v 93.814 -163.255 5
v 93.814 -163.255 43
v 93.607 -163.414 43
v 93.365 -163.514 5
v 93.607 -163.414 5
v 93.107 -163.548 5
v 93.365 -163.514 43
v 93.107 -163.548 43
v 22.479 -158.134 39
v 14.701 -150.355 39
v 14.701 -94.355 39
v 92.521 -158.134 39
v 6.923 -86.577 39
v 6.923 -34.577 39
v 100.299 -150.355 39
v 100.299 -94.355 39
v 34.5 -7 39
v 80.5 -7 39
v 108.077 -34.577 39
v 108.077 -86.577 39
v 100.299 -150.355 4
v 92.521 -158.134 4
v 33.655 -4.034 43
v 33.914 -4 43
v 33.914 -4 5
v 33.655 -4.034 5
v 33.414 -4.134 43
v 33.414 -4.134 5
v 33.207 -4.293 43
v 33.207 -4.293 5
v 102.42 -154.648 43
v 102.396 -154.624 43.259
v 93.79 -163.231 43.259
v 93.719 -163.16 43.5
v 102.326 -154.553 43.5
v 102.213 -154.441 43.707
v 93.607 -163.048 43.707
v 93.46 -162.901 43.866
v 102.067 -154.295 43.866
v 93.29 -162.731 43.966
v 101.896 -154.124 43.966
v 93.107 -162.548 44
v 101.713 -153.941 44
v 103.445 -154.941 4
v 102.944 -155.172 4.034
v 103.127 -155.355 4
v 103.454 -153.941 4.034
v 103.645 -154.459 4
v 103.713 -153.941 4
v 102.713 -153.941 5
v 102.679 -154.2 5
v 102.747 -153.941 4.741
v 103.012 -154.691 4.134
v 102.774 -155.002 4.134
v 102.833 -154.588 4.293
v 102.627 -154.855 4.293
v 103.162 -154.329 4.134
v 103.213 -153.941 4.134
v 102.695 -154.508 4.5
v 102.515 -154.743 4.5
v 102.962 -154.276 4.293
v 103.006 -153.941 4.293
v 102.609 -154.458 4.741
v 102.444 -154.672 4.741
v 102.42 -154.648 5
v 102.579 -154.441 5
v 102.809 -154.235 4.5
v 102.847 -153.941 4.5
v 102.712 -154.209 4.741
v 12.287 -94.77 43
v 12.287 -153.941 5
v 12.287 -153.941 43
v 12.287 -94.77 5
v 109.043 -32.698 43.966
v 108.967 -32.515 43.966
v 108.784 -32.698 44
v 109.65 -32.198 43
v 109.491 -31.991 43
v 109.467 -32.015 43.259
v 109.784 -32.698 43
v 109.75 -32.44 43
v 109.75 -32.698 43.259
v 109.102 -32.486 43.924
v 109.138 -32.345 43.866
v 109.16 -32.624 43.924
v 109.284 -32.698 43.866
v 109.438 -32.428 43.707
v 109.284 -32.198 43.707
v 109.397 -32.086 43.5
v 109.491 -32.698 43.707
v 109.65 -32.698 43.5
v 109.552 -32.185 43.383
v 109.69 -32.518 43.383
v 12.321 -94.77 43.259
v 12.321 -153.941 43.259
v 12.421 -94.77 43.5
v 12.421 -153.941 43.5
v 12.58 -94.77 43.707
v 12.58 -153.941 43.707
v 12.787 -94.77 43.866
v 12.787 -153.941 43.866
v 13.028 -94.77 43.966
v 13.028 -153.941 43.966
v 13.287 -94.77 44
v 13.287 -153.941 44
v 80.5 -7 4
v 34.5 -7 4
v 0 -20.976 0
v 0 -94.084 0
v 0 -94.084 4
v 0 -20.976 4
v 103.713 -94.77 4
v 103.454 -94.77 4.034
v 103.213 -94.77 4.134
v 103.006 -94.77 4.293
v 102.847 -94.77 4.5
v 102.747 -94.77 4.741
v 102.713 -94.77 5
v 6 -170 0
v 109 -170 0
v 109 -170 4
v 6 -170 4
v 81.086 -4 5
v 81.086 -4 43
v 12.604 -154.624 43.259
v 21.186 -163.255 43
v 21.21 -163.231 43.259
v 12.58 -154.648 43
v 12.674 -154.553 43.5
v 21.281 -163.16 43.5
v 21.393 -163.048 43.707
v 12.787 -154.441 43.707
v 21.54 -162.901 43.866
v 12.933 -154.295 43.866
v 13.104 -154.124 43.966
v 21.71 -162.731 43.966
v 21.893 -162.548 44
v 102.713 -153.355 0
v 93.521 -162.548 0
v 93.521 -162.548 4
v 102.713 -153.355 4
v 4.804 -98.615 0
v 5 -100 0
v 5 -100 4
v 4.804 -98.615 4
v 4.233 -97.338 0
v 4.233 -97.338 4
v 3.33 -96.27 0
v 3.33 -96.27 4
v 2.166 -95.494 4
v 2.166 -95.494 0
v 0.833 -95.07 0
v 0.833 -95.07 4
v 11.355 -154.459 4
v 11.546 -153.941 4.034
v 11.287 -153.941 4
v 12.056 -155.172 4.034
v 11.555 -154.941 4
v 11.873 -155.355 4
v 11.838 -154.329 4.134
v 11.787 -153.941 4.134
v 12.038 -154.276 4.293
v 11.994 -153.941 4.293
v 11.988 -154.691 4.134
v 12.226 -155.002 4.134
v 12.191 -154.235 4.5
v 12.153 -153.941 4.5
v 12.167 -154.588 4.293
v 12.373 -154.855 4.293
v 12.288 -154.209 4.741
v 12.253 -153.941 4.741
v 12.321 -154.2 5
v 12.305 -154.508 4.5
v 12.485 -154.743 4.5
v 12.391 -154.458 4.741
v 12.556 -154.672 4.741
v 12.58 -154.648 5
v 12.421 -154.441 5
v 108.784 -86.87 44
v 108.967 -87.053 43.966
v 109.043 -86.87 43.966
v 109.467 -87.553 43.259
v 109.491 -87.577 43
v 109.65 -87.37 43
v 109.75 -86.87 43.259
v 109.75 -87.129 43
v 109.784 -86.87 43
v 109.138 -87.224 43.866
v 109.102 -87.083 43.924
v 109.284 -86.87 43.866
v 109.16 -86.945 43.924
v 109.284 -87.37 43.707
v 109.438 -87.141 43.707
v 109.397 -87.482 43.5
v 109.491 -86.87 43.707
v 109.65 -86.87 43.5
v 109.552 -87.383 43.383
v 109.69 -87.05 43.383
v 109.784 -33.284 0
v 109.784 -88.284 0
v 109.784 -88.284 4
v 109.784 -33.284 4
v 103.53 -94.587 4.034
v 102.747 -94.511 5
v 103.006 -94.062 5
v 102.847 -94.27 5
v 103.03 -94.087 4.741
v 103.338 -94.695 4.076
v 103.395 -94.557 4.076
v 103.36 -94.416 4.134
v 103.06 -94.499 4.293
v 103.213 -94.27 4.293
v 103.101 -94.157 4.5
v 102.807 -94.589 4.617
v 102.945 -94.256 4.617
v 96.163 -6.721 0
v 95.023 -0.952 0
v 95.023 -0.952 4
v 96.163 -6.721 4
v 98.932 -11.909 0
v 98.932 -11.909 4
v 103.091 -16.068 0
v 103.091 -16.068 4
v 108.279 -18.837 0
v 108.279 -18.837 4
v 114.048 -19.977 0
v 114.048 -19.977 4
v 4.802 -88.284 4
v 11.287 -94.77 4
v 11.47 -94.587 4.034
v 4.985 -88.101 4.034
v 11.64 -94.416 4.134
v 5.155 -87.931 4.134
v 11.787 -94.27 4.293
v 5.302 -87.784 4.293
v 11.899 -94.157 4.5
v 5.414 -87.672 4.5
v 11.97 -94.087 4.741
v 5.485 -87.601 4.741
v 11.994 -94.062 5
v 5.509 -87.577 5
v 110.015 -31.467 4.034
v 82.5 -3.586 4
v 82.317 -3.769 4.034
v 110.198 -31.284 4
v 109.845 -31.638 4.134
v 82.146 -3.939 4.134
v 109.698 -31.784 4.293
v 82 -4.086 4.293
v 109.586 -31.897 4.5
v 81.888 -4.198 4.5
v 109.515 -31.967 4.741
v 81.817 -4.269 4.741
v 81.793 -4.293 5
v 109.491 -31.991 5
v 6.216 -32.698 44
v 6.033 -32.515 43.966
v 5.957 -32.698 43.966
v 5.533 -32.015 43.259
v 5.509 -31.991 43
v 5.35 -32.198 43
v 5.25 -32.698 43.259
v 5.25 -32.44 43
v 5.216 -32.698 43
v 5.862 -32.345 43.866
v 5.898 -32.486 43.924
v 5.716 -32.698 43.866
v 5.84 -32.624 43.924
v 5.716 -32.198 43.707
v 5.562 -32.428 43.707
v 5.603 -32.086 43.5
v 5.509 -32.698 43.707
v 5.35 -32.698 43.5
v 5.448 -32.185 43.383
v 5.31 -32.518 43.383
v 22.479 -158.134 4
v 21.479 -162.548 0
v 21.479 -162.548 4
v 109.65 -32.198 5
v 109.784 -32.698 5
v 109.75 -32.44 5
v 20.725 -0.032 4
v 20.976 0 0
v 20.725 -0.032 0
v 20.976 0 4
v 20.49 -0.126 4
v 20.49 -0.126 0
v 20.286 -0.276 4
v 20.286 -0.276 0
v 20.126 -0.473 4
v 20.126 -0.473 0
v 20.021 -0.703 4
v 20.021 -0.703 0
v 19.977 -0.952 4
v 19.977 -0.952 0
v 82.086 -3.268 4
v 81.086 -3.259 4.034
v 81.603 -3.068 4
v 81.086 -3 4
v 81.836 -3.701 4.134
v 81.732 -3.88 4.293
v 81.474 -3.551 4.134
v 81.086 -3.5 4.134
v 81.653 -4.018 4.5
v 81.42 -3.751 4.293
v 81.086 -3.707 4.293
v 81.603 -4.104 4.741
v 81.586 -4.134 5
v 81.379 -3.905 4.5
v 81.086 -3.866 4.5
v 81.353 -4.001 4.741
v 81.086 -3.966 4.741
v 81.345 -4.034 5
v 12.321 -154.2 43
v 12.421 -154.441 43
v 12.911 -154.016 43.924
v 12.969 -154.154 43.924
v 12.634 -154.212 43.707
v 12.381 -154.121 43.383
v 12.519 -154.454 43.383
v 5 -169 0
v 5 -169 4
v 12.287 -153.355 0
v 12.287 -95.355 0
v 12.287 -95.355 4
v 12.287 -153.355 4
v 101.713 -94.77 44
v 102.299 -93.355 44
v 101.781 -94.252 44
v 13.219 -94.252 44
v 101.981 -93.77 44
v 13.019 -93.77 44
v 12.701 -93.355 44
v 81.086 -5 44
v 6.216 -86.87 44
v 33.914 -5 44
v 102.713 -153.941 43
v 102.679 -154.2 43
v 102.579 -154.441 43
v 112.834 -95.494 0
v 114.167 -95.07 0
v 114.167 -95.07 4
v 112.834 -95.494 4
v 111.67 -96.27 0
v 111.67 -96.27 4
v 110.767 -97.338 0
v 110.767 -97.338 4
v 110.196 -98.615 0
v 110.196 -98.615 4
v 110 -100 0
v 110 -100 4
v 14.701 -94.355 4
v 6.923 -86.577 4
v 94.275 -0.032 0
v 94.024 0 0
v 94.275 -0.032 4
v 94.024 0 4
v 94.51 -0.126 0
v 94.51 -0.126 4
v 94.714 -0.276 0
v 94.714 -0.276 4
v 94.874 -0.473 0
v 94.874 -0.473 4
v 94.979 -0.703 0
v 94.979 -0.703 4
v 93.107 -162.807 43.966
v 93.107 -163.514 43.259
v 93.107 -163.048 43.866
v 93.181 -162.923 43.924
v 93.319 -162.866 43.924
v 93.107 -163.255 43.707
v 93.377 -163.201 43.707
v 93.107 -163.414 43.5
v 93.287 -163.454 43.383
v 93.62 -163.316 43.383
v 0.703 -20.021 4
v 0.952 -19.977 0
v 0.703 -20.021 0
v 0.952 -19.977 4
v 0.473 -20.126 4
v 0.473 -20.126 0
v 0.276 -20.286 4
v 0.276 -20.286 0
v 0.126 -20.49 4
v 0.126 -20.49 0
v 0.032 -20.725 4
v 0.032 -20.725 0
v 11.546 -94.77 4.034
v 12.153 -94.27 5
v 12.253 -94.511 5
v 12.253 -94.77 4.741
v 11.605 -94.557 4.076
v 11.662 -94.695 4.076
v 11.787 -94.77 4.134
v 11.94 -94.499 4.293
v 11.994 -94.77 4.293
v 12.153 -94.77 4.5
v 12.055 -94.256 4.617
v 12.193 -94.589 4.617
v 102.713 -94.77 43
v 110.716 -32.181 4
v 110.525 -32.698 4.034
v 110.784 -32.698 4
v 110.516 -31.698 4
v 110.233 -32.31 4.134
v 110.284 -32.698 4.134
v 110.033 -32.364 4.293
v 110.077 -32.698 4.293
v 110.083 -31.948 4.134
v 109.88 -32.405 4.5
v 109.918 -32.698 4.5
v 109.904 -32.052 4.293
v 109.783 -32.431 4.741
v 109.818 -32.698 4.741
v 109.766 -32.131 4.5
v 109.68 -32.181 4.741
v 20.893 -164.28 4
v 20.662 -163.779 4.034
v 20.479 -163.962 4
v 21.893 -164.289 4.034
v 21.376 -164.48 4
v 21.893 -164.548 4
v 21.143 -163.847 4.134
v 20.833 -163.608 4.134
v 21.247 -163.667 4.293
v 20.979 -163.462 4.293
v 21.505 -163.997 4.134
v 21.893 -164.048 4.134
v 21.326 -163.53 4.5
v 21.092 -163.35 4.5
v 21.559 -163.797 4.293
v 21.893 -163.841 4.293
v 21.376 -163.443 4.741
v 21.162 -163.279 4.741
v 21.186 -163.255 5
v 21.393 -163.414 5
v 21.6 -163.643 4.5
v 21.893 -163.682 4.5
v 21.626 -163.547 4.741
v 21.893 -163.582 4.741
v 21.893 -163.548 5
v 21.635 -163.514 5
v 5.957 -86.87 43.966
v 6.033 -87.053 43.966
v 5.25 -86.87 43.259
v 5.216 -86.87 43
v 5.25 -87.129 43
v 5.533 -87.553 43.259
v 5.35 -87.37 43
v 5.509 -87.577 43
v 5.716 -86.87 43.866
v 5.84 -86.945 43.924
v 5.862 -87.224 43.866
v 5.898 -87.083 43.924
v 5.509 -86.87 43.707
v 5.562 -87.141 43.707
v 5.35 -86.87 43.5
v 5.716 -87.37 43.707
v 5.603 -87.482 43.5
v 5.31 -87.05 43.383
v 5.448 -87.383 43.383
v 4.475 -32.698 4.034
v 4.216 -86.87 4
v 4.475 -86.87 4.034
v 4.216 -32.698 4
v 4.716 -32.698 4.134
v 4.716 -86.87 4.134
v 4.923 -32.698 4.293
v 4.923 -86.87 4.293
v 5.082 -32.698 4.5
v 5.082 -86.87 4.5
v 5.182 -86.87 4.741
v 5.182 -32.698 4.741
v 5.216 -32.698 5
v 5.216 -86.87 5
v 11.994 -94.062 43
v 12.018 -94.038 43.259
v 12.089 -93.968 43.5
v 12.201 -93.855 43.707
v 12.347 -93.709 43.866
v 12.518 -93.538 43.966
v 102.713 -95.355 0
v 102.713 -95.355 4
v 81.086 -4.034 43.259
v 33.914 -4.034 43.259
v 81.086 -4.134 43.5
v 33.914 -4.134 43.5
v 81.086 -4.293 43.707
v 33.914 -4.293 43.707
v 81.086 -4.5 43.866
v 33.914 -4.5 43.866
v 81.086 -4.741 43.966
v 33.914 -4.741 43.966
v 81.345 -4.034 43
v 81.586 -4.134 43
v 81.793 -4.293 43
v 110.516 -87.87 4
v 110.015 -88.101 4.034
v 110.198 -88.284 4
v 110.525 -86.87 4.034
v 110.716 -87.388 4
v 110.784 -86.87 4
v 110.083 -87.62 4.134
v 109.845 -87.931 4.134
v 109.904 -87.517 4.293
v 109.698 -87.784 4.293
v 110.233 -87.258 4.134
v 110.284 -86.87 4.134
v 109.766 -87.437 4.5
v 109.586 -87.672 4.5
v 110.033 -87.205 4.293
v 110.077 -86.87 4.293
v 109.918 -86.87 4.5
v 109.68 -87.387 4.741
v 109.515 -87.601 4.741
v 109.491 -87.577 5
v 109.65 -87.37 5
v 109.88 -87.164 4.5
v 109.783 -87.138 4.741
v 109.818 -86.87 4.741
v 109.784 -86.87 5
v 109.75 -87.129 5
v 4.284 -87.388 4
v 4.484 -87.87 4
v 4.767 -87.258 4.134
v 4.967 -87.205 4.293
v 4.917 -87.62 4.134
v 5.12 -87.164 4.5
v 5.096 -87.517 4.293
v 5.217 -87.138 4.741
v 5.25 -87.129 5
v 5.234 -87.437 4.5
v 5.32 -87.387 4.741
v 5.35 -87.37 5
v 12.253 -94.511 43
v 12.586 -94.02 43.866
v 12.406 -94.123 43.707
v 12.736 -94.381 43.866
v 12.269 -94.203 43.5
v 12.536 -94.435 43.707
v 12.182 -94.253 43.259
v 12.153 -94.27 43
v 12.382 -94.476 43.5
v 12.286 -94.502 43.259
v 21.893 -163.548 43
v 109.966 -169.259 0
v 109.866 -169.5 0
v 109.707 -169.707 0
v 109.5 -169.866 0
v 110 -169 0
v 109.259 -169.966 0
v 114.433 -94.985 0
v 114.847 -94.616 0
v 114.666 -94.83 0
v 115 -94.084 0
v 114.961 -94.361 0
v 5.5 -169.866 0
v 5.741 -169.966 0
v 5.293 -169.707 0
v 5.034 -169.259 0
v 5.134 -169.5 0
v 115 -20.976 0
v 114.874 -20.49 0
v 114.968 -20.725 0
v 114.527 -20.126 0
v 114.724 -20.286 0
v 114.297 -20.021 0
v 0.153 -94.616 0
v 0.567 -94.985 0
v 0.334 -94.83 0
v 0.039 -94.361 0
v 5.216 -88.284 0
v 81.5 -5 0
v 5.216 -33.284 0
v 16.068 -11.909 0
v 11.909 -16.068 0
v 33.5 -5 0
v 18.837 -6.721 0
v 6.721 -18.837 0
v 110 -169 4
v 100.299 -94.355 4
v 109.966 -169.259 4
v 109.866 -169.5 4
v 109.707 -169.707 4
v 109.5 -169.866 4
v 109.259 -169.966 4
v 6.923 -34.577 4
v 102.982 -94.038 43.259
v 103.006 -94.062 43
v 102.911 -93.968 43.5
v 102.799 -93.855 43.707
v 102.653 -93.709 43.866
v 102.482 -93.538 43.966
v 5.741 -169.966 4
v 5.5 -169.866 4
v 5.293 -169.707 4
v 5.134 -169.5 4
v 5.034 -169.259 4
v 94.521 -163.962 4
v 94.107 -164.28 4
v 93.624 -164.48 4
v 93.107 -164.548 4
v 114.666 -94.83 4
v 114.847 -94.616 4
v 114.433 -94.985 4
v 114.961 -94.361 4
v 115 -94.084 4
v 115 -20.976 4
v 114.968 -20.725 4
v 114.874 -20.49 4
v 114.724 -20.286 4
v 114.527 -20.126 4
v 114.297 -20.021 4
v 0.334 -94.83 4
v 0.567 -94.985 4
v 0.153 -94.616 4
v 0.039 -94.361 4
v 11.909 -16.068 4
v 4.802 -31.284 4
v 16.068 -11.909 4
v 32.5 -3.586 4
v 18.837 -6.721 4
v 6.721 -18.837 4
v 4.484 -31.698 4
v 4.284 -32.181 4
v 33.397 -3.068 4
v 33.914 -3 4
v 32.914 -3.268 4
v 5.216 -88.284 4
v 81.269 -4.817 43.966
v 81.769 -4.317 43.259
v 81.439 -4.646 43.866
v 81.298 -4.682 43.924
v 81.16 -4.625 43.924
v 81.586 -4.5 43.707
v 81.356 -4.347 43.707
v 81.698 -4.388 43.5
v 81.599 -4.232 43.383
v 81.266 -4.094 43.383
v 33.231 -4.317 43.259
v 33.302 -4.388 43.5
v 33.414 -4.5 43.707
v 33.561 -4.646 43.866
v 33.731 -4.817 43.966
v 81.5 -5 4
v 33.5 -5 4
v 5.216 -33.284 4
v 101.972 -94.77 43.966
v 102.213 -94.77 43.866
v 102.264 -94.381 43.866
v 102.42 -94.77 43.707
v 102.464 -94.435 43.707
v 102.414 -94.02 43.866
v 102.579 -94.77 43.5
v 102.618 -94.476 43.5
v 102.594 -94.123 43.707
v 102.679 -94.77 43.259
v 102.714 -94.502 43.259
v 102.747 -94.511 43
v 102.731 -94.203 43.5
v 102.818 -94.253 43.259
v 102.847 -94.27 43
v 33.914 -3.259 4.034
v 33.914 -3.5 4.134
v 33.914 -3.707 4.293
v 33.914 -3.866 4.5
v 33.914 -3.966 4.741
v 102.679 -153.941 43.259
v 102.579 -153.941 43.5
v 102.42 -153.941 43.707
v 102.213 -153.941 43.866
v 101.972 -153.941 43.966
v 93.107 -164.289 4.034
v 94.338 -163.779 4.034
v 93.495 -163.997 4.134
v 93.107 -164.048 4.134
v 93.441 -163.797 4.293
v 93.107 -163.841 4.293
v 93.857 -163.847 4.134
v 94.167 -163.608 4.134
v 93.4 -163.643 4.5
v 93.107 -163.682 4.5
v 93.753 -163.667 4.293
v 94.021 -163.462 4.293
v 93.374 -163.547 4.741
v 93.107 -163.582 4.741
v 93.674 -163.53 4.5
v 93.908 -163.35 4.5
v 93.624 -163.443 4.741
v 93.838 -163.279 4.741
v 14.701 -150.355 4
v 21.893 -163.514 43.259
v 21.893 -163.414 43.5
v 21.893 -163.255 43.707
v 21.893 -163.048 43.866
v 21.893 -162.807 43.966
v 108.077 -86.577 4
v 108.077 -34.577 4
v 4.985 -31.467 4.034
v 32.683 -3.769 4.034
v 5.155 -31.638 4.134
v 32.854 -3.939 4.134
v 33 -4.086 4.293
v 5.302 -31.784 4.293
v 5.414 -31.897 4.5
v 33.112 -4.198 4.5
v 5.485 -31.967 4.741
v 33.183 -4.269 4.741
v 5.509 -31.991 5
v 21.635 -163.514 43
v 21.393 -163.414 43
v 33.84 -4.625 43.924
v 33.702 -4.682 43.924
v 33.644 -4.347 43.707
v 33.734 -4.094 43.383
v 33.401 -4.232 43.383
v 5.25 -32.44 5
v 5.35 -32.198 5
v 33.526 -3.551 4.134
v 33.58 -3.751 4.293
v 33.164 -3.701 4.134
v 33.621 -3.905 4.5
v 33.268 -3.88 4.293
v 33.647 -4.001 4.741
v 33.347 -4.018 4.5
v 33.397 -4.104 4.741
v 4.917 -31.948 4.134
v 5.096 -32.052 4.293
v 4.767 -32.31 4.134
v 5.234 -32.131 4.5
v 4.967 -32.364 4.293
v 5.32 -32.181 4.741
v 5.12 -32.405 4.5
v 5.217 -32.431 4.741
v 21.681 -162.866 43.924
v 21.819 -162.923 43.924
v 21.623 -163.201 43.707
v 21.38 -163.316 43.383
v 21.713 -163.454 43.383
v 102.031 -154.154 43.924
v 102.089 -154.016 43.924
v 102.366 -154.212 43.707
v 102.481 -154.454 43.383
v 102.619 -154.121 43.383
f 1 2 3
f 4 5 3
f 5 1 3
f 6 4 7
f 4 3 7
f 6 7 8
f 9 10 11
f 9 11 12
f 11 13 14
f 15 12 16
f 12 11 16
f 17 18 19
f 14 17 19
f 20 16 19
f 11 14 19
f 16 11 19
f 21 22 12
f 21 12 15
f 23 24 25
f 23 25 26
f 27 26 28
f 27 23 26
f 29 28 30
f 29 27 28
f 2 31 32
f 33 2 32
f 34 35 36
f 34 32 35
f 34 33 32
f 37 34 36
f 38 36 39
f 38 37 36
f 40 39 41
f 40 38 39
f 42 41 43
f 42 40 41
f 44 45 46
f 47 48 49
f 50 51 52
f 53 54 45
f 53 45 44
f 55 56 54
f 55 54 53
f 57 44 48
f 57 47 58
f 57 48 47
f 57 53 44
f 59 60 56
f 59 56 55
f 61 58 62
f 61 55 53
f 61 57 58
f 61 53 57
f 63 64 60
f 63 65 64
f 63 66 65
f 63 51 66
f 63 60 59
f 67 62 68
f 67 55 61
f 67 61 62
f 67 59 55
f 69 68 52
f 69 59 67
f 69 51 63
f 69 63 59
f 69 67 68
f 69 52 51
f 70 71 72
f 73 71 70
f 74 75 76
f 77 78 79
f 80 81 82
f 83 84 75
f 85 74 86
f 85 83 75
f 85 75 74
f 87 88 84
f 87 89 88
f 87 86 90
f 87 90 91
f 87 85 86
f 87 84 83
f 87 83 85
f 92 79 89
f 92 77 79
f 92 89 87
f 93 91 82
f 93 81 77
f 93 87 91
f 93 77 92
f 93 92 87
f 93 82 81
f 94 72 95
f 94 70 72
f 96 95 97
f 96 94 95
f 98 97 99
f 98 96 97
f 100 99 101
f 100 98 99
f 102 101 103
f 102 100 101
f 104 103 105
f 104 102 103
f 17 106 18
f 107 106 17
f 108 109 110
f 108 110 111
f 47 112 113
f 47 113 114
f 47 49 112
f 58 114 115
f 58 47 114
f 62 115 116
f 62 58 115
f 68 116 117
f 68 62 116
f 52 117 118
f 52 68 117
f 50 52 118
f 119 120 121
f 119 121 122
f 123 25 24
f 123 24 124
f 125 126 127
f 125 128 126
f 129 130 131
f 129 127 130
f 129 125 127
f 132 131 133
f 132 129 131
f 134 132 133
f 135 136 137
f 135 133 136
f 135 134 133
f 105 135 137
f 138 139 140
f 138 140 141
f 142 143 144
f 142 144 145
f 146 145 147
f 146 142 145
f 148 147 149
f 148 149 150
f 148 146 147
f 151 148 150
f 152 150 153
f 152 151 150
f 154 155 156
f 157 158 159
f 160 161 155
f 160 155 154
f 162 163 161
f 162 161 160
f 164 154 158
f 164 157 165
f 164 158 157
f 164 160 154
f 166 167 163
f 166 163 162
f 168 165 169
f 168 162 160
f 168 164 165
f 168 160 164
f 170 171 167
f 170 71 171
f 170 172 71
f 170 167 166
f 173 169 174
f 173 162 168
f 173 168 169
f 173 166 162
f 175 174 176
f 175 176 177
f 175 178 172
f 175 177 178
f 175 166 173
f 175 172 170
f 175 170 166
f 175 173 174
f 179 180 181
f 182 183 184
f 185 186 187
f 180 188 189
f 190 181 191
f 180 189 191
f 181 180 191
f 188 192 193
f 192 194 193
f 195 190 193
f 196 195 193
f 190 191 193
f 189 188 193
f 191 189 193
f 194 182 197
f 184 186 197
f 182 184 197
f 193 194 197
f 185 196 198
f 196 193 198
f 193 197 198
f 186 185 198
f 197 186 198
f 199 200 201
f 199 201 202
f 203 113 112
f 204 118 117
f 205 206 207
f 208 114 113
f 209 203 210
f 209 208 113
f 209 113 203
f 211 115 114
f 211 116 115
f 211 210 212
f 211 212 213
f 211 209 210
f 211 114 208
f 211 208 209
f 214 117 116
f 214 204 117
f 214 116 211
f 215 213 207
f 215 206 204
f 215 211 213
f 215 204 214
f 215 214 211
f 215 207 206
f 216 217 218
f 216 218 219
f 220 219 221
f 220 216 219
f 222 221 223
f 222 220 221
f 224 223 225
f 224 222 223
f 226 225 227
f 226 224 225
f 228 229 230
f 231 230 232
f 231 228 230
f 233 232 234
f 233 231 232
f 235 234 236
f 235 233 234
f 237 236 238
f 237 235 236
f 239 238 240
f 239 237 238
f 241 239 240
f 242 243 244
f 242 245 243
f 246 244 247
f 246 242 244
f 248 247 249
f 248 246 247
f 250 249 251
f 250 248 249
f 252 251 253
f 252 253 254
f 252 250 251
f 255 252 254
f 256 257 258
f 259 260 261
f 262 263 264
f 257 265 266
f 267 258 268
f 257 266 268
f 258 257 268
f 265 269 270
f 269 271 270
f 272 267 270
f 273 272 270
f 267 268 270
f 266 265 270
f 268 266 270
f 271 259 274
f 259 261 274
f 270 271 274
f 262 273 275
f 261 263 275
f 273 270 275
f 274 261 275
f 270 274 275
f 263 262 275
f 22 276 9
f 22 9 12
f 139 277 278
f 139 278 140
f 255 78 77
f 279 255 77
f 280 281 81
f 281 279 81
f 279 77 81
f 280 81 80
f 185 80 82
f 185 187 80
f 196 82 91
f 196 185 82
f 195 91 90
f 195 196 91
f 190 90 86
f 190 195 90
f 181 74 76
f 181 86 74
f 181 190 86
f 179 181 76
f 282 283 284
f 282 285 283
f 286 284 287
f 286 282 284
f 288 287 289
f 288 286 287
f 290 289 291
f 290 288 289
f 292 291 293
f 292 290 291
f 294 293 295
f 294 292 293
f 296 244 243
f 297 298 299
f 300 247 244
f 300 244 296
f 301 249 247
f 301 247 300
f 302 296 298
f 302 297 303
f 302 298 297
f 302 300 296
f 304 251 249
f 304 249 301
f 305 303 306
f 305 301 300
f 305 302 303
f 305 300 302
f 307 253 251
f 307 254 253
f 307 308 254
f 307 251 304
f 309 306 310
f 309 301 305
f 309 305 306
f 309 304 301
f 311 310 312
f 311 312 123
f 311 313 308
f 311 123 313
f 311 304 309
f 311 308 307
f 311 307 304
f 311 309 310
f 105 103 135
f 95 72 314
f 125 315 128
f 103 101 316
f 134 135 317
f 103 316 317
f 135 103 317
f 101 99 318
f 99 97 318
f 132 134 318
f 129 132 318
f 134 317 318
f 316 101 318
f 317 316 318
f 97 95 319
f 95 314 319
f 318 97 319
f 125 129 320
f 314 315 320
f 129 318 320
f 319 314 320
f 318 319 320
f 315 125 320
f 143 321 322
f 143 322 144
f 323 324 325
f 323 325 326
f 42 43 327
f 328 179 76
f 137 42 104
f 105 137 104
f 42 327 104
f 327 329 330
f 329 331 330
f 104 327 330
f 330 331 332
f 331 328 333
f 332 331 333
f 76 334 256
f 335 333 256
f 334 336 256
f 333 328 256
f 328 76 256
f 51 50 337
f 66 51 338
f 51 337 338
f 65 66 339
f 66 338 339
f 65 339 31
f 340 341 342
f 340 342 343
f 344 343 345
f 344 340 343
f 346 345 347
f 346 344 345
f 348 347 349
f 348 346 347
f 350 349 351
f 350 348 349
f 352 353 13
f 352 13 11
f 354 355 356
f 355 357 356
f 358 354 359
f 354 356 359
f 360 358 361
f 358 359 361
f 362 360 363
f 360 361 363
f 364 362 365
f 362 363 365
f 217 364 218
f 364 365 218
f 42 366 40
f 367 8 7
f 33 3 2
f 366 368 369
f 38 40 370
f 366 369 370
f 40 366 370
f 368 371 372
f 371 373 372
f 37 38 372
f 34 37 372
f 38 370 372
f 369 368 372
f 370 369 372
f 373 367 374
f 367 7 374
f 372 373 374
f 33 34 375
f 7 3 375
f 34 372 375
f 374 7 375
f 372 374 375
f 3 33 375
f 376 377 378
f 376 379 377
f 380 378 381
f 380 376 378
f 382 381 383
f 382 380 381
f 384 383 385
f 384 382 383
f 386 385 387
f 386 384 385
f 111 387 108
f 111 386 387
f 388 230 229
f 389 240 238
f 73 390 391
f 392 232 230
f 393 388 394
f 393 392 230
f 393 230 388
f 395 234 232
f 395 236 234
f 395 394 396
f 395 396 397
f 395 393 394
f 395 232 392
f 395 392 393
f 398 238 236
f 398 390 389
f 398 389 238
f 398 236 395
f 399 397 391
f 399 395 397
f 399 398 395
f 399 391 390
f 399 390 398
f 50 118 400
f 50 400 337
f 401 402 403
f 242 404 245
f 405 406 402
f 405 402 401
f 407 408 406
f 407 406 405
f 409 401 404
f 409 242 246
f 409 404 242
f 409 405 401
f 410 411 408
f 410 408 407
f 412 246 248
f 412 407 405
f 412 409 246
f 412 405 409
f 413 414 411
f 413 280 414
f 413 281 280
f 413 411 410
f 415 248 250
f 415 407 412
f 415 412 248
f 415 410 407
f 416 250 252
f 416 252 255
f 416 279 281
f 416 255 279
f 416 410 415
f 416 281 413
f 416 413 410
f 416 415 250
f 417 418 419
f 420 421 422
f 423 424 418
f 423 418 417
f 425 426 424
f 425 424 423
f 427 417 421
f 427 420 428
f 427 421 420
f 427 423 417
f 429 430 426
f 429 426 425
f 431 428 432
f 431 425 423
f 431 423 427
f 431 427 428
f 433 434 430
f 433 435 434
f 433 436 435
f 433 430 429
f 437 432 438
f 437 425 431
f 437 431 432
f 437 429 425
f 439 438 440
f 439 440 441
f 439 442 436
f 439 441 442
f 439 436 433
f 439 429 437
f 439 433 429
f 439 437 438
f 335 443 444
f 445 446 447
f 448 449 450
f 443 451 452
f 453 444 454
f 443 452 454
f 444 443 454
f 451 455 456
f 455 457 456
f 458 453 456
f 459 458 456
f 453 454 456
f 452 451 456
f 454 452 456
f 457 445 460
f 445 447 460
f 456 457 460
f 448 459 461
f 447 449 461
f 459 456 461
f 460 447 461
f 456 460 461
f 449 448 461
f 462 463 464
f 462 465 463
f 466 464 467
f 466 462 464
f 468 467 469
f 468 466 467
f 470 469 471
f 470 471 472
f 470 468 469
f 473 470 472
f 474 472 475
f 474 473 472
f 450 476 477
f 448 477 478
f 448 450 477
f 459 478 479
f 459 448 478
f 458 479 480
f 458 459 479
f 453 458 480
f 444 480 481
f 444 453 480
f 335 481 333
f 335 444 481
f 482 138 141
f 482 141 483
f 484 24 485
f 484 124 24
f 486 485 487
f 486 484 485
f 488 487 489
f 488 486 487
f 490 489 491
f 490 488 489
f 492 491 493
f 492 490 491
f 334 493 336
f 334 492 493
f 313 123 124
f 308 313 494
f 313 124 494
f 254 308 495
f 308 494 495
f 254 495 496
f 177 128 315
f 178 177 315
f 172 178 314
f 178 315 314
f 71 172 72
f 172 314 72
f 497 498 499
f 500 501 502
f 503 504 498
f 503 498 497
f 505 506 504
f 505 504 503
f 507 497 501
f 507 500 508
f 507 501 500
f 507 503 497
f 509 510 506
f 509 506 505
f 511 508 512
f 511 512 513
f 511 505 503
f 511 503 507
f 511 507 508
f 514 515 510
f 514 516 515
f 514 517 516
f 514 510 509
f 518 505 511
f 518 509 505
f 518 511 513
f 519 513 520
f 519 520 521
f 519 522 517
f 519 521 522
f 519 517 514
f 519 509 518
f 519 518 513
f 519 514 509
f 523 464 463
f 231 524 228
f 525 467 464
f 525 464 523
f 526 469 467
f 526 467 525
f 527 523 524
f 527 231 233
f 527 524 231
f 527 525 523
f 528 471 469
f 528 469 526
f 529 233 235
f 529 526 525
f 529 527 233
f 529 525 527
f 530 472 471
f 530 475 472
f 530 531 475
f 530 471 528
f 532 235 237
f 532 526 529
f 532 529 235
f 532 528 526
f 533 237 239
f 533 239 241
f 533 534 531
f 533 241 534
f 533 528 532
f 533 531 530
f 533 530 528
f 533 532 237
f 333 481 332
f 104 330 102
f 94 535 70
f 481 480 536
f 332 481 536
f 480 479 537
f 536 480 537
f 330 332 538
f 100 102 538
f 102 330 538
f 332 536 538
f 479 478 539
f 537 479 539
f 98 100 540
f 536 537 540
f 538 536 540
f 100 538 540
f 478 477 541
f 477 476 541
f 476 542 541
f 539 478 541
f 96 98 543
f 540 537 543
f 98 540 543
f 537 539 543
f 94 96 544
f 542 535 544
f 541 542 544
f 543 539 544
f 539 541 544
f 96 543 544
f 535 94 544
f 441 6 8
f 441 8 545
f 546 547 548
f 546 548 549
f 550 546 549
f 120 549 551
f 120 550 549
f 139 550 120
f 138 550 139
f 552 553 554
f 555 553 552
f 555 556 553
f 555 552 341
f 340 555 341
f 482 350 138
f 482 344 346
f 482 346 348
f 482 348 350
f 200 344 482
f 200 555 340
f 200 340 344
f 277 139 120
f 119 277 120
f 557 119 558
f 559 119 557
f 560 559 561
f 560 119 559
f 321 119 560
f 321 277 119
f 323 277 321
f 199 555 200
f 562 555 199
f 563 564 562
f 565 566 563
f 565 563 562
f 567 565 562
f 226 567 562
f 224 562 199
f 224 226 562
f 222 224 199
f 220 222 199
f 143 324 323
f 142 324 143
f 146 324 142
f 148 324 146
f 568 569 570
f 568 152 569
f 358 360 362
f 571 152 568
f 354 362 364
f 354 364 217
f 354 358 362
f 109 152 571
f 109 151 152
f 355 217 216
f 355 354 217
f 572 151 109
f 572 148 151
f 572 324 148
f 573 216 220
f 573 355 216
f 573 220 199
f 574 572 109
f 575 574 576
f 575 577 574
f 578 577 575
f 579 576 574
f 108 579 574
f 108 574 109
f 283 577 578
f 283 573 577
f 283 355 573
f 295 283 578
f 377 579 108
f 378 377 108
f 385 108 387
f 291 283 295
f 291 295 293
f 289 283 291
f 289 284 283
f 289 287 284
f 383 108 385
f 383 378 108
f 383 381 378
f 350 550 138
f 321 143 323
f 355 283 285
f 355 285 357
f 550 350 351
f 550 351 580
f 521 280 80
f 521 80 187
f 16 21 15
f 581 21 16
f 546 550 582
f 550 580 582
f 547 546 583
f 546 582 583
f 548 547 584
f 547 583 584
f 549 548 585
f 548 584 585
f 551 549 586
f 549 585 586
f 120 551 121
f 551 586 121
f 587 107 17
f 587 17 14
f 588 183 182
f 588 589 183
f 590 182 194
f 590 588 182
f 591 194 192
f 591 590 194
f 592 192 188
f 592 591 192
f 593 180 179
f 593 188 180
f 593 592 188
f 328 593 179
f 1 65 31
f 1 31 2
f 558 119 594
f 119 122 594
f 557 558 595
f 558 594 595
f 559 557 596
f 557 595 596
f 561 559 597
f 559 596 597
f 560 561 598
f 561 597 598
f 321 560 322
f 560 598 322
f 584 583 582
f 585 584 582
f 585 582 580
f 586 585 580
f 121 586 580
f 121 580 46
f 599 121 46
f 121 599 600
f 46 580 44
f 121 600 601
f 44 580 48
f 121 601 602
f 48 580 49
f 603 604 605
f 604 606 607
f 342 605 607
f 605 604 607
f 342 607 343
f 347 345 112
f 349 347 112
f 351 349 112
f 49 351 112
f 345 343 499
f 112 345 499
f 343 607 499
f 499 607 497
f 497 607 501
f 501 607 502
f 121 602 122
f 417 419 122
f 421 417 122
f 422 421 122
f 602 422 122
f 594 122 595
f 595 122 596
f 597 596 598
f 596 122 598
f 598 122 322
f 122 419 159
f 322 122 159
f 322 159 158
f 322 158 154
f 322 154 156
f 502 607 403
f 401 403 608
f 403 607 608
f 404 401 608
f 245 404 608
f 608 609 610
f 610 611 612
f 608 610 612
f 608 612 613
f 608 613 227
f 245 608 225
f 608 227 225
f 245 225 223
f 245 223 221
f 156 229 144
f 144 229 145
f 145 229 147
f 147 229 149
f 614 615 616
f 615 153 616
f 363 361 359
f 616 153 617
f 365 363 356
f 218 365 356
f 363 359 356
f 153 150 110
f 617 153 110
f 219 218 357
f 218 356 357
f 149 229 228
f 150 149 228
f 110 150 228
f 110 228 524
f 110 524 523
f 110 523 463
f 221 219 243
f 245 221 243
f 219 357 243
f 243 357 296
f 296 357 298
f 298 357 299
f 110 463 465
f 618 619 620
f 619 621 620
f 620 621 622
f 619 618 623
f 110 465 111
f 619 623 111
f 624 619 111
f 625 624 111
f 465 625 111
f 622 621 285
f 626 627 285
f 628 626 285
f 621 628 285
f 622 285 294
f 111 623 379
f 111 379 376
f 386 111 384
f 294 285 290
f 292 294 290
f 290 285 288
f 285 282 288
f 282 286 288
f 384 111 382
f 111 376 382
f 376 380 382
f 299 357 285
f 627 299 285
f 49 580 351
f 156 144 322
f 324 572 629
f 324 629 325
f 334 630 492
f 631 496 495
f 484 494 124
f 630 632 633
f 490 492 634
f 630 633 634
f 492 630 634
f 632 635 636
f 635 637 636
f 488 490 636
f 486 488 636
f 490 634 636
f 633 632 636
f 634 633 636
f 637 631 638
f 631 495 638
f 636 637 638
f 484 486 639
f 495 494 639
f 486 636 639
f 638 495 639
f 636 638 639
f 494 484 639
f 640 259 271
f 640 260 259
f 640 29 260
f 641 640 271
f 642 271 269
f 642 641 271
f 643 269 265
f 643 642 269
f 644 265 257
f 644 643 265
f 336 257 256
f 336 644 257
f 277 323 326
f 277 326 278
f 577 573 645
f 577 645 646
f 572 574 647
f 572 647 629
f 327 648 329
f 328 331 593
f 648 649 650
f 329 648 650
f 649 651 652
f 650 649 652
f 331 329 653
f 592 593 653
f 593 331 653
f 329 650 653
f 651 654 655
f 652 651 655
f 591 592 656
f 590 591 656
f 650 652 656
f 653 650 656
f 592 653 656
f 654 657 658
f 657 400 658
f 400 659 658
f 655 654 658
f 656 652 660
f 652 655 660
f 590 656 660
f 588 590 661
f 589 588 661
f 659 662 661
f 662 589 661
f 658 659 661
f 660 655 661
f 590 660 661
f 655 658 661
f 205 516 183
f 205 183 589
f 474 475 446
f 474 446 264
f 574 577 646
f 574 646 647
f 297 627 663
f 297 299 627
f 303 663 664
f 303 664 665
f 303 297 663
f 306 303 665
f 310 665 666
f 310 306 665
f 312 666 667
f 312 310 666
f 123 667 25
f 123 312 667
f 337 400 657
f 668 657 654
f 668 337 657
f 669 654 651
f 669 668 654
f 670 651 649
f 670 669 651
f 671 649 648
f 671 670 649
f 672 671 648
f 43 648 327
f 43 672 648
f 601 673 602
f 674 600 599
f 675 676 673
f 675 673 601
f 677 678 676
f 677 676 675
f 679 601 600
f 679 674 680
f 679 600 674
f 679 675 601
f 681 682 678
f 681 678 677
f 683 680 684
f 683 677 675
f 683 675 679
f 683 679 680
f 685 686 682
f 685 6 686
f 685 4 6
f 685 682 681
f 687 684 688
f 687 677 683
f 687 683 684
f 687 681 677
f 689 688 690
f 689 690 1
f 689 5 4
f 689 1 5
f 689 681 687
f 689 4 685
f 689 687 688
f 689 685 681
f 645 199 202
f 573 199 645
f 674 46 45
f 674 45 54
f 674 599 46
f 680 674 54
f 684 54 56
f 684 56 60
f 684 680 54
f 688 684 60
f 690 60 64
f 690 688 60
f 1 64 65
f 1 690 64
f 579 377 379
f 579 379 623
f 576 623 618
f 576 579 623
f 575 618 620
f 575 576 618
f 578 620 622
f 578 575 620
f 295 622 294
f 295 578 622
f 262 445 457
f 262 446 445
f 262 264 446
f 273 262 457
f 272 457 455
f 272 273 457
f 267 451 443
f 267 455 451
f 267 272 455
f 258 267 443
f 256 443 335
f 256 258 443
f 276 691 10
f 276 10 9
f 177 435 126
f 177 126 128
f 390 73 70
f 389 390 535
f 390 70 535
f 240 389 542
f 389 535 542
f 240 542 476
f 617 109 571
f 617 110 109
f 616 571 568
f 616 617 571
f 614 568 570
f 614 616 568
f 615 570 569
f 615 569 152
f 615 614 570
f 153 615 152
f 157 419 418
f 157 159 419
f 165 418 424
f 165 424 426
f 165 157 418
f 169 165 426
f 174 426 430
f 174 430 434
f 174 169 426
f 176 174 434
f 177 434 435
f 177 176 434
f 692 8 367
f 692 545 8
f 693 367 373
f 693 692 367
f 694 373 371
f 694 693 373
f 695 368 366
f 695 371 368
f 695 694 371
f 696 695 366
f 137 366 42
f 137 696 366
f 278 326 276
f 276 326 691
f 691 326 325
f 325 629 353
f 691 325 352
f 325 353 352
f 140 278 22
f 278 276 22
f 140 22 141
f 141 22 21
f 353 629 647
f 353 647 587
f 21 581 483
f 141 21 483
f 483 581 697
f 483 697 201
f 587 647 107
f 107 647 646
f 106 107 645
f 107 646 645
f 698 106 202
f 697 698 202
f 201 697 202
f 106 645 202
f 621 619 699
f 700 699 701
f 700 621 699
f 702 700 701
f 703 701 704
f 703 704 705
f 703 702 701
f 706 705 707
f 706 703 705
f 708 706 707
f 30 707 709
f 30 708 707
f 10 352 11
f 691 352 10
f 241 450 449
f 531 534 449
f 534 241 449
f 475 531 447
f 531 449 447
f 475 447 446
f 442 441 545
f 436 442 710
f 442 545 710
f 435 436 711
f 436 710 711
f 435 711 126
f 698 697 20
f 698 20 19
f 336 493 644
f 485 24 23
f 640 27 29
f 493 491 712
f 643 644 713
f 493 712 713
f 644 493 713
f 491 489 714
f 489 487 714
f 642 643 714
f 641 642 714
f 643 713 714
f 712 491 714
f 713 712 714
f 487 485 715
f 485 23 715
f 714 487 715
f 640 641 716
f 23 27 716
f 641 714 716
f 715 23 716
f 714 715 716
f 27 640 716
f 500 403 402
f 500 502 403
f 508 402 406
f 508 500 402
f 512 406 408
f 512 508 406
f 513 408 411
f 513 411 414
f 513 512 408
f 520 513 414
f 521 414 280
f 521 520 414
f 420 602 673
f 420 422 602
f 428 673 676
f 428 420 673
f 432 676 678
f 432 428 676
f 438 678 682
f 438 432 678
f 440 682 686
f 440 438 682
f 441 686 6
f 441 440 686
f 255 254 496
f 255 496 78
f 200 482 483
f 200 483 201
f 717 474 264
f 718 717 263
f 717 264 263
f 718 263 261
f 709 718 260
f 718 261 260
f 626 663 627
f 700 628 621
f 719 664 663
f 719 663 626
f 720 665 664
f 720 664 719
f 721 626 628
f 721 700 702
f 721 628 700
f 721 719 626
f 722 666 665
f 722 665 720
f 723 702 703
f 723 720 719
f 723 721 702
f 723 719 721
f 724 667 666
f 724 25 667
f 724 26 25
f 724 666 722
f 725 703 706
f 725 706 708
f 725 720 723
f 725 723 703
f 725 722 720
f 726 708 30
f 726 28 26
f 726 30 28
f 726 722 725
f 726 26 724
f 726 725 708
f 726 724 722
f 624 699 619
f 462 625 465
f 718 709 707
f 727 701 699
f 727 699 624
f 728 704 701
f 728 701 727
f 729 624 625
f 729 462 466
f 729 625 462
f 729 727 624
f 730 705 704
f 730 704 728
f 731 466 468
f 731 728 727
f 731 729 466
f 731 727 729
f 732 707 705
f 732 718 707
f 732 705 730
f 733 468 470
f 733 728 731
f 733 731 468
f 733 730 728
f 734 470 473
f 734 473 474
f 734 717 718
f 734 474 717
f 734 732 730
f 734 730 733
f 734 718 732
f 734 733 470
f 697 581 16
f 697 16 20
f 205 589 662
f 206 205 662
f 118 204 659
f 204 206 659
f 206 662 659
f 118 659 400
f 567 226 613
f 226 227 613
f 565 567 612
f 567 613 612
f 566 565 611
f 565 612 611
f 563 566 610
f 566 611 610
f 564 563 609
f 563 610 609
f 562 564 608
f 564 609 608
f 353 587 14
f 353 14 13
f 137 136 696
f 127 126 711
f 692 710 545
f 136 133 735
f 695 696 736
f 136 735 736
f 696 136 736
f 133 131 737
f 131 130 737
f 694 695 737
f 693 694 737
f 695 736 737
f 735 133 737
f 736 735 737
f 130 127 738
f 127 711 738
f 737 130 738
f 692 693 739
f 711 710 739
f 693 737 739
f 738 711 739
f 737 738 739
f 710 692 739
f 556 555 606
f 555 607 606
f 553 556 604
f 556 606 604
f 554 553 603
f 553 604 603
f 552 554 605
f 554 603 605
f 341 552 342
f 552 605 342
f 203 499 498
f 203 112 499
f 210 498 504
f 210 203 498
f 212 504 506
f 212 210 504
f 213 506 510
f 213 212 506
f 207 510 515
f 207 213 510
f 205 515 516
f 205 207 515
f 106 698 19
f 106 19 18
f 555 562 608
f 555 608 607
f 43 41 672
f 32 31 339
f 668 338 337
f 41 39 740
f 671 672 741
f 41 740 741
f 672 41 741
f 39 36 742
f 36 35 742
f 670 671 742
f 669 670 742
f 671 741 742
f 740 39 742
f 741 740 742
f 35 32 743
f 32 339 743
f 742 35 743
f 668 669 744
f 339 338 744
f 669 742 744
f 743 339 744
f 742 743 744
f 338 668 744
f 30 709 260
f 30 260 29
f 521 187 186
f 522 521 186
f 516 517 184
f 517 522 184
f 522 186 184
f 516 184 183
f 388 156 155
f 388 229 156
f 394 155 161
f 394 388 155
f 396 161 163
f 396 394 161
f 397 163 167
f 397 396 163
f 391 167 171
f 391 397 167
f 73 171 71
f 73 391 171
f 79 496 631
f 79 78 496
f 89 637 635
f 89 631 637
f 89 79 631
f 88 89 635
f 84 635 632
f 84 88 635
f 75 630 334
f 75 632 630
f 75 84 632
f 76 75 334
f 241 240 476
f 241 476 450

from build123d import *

# Parameters (mm, degrees)
Y_KSEKLIK_EKSTR_ZYON5_DEPTH = 4
Y_KSEKLIK_EKSTR_ZYON6_DEPTH = 40
RADYUS2_R                   = 1
KES_EKSTR_ZYON1_DEPTH       = 4
KES_EKSTR_ZYON2_DEPTH       = 35


with BuildPart() as part:
    # Çizim1 → Yükseklik-Ekstrüzyon5 (new body)
    with BuildSketch(Plane.XY):
        with BuildLine():
            Line((20, 0), (95, 0))
            ThreePointArc((95, 0), (100.857864376, -14.142135624), (115, -20))
            Line((115, -20), (115, -95))
            ThreePointArc((115, -95), (111.464466094, -96.464466094), (110, -100))
            Line((110, -100), (110, -170))
            Line((110, -170), (5, -170))
            Line((5, -170), (5, -100))
            ThreePointArc((5, -100), (3.535533906, -96.464466094), (0, -95))
            Line((0, -95), (0, -20))
            ThreePointArc((0, -20), (14.142135624, -14.142135624), (20, 0))
        make_face()
    extrude(amount=Y_KSEKLIK_EKSTR_ZYON5_DEPTH)

    # Çizim6 → Yükseklik-Ekstrüzyon6 (add)
    with BuildSketch(Plane.XY.offset(4)):
        Polygon((33.5, -4), (81.5, -4), (109.784271247, -32.284271247), (109.784271247, -87.284271247), (102.713203436, -94.355339059), (102.713203436, -154.355339059), (93.52081528, -163.547727215), (21.47918472, -163.547727215), (12.286796564, -154.355339059), (12.286796564, -94.355339059), (5.215728753, -87.284271247), (5.215728753, -32.284271247), align=None)
    extrude(amount=Y_KSEKLIK_EKSTR_ZYON6_DEPTH)

    # Radyus2
    radyus2_edges = [part.edges().sort_by_distance(p)[0] for p in [
        (20, 0, 2),
        (95, 0, 2),
        (115, -20, 2),
        (115, -95, 2),
        (110, -170, 2),
        (5, -170, 2),
        (0, -95, 2),
        (0, -20, 2),
        (95.642135624, -18.142135624, 4),
        (109.784271247, -32.284271247, 24),
        (57.5, -4, 4),
        (81.5, -4, 24),
        (19.357864376, -18.142135624, 4),
        (33.5, -4, 24),
        (5.215728753, -59.784271247, 4),
        (5.215728753, -32.284271247, 24),
        (8.751262658, -90.819805153, 4),
        (5.215728753, -87.284271247, 24),
        (12.286796564, -124.355339059, 4),
        (12.286796564, -94.355339059, 24),
        (16.882990642, -158.951533137, 4),
        (12.286796564, -154.355339059, 24),
        (57.5, -163.547727215, 4),
        (21.47918472, -163.547727215, 24),
        (98.117009358, -158.951533137, 4),
        (93.52081528, -163.547727215, 24),
        (102.713203436, -124.355339059, 4),
        (102.713203436, -154.355339059, 24),
        (106.248737342, -90.819805153, 4),
        (102.713203436, -94.355339059, 24),
        (109.784271247, -59.784271247, 4),
        (109.784271247, -87.284271247, 24),
        (95.642135624, -18.142135624, 44),
        (57.5, -4, 44),
        (19.357864376, -18.142135624, 44),
        (5.215728753, -59.784271247, 44),
        (8.751262658, -90.819805153, 44),
        (12.286796564, -124.355339059, 44),
        (16.882990642, -158.951533137, 44),
        (57.5, -163.547727215, 44),
        (98.117009358, -158.951533137, 44),
        (102.713203436, -124.355339059, 44),
        (106.248737342, -90.819805153, 44),
        (109.784271247, -59.784271247, 44),
    ]]
    fillet(radyus2_edges, radius=RADYUS2_R)

    # Çizim8 → Kes-Ekstrüzyon1 (cut)
    with BuildSketch(Plane(origin=(0, 0, 0), x_dir=(-1, 0, 0), z_dir=(0, 0, -1))):
        Polygon((-81.5, -5), (-33.5, -5), (-5.215728753, -33.284271247), (-5.215728753, -88.284271247), (-12.286796564, -95.355339059), (-12.286796564, -153.355339059), (-21.47918472, -162.547727215), (-93.52081528, -162.547727215), (-102.713203436, -153.355339059), (-102.713203436, -95.355339059), (-109.784271247, -88.284271247), (-109.784271247, -33.284271247), align=None)
    extrude(amount=-KES_EKSTR_ZYON1_DEPTH, mode=Mode.SUBTRACT)

    # Çizim9 → Kes-Ekstrüzyon2 (cut)
    with BuildSketch(Plane(origin=(0, 0, 4), x_dir=(-1, 0, 0), z_dir=(0, 0, -1))):
        Polygon((-80.5, -7), (-34.5, -7), (-6.922835534, -34.577164466), (-6.922835534, -86.577164466), (-14.701010127, -94.355339059), (-14.701010127, -150.355339059), (-22.47918472, -158.133513652), (-92.52081528, -158.133513652), (-100.298989873, -150.355339059), (-100.298989873, -94.355339059), (-108.077164466, -86.577164466), (-108.077164466, -34.577164466), align=None)
    extrude(amount=-KES_EKSTR_ZYON2_DEPTH, mode=Mode.SUBTRACT)


solid = part.part
